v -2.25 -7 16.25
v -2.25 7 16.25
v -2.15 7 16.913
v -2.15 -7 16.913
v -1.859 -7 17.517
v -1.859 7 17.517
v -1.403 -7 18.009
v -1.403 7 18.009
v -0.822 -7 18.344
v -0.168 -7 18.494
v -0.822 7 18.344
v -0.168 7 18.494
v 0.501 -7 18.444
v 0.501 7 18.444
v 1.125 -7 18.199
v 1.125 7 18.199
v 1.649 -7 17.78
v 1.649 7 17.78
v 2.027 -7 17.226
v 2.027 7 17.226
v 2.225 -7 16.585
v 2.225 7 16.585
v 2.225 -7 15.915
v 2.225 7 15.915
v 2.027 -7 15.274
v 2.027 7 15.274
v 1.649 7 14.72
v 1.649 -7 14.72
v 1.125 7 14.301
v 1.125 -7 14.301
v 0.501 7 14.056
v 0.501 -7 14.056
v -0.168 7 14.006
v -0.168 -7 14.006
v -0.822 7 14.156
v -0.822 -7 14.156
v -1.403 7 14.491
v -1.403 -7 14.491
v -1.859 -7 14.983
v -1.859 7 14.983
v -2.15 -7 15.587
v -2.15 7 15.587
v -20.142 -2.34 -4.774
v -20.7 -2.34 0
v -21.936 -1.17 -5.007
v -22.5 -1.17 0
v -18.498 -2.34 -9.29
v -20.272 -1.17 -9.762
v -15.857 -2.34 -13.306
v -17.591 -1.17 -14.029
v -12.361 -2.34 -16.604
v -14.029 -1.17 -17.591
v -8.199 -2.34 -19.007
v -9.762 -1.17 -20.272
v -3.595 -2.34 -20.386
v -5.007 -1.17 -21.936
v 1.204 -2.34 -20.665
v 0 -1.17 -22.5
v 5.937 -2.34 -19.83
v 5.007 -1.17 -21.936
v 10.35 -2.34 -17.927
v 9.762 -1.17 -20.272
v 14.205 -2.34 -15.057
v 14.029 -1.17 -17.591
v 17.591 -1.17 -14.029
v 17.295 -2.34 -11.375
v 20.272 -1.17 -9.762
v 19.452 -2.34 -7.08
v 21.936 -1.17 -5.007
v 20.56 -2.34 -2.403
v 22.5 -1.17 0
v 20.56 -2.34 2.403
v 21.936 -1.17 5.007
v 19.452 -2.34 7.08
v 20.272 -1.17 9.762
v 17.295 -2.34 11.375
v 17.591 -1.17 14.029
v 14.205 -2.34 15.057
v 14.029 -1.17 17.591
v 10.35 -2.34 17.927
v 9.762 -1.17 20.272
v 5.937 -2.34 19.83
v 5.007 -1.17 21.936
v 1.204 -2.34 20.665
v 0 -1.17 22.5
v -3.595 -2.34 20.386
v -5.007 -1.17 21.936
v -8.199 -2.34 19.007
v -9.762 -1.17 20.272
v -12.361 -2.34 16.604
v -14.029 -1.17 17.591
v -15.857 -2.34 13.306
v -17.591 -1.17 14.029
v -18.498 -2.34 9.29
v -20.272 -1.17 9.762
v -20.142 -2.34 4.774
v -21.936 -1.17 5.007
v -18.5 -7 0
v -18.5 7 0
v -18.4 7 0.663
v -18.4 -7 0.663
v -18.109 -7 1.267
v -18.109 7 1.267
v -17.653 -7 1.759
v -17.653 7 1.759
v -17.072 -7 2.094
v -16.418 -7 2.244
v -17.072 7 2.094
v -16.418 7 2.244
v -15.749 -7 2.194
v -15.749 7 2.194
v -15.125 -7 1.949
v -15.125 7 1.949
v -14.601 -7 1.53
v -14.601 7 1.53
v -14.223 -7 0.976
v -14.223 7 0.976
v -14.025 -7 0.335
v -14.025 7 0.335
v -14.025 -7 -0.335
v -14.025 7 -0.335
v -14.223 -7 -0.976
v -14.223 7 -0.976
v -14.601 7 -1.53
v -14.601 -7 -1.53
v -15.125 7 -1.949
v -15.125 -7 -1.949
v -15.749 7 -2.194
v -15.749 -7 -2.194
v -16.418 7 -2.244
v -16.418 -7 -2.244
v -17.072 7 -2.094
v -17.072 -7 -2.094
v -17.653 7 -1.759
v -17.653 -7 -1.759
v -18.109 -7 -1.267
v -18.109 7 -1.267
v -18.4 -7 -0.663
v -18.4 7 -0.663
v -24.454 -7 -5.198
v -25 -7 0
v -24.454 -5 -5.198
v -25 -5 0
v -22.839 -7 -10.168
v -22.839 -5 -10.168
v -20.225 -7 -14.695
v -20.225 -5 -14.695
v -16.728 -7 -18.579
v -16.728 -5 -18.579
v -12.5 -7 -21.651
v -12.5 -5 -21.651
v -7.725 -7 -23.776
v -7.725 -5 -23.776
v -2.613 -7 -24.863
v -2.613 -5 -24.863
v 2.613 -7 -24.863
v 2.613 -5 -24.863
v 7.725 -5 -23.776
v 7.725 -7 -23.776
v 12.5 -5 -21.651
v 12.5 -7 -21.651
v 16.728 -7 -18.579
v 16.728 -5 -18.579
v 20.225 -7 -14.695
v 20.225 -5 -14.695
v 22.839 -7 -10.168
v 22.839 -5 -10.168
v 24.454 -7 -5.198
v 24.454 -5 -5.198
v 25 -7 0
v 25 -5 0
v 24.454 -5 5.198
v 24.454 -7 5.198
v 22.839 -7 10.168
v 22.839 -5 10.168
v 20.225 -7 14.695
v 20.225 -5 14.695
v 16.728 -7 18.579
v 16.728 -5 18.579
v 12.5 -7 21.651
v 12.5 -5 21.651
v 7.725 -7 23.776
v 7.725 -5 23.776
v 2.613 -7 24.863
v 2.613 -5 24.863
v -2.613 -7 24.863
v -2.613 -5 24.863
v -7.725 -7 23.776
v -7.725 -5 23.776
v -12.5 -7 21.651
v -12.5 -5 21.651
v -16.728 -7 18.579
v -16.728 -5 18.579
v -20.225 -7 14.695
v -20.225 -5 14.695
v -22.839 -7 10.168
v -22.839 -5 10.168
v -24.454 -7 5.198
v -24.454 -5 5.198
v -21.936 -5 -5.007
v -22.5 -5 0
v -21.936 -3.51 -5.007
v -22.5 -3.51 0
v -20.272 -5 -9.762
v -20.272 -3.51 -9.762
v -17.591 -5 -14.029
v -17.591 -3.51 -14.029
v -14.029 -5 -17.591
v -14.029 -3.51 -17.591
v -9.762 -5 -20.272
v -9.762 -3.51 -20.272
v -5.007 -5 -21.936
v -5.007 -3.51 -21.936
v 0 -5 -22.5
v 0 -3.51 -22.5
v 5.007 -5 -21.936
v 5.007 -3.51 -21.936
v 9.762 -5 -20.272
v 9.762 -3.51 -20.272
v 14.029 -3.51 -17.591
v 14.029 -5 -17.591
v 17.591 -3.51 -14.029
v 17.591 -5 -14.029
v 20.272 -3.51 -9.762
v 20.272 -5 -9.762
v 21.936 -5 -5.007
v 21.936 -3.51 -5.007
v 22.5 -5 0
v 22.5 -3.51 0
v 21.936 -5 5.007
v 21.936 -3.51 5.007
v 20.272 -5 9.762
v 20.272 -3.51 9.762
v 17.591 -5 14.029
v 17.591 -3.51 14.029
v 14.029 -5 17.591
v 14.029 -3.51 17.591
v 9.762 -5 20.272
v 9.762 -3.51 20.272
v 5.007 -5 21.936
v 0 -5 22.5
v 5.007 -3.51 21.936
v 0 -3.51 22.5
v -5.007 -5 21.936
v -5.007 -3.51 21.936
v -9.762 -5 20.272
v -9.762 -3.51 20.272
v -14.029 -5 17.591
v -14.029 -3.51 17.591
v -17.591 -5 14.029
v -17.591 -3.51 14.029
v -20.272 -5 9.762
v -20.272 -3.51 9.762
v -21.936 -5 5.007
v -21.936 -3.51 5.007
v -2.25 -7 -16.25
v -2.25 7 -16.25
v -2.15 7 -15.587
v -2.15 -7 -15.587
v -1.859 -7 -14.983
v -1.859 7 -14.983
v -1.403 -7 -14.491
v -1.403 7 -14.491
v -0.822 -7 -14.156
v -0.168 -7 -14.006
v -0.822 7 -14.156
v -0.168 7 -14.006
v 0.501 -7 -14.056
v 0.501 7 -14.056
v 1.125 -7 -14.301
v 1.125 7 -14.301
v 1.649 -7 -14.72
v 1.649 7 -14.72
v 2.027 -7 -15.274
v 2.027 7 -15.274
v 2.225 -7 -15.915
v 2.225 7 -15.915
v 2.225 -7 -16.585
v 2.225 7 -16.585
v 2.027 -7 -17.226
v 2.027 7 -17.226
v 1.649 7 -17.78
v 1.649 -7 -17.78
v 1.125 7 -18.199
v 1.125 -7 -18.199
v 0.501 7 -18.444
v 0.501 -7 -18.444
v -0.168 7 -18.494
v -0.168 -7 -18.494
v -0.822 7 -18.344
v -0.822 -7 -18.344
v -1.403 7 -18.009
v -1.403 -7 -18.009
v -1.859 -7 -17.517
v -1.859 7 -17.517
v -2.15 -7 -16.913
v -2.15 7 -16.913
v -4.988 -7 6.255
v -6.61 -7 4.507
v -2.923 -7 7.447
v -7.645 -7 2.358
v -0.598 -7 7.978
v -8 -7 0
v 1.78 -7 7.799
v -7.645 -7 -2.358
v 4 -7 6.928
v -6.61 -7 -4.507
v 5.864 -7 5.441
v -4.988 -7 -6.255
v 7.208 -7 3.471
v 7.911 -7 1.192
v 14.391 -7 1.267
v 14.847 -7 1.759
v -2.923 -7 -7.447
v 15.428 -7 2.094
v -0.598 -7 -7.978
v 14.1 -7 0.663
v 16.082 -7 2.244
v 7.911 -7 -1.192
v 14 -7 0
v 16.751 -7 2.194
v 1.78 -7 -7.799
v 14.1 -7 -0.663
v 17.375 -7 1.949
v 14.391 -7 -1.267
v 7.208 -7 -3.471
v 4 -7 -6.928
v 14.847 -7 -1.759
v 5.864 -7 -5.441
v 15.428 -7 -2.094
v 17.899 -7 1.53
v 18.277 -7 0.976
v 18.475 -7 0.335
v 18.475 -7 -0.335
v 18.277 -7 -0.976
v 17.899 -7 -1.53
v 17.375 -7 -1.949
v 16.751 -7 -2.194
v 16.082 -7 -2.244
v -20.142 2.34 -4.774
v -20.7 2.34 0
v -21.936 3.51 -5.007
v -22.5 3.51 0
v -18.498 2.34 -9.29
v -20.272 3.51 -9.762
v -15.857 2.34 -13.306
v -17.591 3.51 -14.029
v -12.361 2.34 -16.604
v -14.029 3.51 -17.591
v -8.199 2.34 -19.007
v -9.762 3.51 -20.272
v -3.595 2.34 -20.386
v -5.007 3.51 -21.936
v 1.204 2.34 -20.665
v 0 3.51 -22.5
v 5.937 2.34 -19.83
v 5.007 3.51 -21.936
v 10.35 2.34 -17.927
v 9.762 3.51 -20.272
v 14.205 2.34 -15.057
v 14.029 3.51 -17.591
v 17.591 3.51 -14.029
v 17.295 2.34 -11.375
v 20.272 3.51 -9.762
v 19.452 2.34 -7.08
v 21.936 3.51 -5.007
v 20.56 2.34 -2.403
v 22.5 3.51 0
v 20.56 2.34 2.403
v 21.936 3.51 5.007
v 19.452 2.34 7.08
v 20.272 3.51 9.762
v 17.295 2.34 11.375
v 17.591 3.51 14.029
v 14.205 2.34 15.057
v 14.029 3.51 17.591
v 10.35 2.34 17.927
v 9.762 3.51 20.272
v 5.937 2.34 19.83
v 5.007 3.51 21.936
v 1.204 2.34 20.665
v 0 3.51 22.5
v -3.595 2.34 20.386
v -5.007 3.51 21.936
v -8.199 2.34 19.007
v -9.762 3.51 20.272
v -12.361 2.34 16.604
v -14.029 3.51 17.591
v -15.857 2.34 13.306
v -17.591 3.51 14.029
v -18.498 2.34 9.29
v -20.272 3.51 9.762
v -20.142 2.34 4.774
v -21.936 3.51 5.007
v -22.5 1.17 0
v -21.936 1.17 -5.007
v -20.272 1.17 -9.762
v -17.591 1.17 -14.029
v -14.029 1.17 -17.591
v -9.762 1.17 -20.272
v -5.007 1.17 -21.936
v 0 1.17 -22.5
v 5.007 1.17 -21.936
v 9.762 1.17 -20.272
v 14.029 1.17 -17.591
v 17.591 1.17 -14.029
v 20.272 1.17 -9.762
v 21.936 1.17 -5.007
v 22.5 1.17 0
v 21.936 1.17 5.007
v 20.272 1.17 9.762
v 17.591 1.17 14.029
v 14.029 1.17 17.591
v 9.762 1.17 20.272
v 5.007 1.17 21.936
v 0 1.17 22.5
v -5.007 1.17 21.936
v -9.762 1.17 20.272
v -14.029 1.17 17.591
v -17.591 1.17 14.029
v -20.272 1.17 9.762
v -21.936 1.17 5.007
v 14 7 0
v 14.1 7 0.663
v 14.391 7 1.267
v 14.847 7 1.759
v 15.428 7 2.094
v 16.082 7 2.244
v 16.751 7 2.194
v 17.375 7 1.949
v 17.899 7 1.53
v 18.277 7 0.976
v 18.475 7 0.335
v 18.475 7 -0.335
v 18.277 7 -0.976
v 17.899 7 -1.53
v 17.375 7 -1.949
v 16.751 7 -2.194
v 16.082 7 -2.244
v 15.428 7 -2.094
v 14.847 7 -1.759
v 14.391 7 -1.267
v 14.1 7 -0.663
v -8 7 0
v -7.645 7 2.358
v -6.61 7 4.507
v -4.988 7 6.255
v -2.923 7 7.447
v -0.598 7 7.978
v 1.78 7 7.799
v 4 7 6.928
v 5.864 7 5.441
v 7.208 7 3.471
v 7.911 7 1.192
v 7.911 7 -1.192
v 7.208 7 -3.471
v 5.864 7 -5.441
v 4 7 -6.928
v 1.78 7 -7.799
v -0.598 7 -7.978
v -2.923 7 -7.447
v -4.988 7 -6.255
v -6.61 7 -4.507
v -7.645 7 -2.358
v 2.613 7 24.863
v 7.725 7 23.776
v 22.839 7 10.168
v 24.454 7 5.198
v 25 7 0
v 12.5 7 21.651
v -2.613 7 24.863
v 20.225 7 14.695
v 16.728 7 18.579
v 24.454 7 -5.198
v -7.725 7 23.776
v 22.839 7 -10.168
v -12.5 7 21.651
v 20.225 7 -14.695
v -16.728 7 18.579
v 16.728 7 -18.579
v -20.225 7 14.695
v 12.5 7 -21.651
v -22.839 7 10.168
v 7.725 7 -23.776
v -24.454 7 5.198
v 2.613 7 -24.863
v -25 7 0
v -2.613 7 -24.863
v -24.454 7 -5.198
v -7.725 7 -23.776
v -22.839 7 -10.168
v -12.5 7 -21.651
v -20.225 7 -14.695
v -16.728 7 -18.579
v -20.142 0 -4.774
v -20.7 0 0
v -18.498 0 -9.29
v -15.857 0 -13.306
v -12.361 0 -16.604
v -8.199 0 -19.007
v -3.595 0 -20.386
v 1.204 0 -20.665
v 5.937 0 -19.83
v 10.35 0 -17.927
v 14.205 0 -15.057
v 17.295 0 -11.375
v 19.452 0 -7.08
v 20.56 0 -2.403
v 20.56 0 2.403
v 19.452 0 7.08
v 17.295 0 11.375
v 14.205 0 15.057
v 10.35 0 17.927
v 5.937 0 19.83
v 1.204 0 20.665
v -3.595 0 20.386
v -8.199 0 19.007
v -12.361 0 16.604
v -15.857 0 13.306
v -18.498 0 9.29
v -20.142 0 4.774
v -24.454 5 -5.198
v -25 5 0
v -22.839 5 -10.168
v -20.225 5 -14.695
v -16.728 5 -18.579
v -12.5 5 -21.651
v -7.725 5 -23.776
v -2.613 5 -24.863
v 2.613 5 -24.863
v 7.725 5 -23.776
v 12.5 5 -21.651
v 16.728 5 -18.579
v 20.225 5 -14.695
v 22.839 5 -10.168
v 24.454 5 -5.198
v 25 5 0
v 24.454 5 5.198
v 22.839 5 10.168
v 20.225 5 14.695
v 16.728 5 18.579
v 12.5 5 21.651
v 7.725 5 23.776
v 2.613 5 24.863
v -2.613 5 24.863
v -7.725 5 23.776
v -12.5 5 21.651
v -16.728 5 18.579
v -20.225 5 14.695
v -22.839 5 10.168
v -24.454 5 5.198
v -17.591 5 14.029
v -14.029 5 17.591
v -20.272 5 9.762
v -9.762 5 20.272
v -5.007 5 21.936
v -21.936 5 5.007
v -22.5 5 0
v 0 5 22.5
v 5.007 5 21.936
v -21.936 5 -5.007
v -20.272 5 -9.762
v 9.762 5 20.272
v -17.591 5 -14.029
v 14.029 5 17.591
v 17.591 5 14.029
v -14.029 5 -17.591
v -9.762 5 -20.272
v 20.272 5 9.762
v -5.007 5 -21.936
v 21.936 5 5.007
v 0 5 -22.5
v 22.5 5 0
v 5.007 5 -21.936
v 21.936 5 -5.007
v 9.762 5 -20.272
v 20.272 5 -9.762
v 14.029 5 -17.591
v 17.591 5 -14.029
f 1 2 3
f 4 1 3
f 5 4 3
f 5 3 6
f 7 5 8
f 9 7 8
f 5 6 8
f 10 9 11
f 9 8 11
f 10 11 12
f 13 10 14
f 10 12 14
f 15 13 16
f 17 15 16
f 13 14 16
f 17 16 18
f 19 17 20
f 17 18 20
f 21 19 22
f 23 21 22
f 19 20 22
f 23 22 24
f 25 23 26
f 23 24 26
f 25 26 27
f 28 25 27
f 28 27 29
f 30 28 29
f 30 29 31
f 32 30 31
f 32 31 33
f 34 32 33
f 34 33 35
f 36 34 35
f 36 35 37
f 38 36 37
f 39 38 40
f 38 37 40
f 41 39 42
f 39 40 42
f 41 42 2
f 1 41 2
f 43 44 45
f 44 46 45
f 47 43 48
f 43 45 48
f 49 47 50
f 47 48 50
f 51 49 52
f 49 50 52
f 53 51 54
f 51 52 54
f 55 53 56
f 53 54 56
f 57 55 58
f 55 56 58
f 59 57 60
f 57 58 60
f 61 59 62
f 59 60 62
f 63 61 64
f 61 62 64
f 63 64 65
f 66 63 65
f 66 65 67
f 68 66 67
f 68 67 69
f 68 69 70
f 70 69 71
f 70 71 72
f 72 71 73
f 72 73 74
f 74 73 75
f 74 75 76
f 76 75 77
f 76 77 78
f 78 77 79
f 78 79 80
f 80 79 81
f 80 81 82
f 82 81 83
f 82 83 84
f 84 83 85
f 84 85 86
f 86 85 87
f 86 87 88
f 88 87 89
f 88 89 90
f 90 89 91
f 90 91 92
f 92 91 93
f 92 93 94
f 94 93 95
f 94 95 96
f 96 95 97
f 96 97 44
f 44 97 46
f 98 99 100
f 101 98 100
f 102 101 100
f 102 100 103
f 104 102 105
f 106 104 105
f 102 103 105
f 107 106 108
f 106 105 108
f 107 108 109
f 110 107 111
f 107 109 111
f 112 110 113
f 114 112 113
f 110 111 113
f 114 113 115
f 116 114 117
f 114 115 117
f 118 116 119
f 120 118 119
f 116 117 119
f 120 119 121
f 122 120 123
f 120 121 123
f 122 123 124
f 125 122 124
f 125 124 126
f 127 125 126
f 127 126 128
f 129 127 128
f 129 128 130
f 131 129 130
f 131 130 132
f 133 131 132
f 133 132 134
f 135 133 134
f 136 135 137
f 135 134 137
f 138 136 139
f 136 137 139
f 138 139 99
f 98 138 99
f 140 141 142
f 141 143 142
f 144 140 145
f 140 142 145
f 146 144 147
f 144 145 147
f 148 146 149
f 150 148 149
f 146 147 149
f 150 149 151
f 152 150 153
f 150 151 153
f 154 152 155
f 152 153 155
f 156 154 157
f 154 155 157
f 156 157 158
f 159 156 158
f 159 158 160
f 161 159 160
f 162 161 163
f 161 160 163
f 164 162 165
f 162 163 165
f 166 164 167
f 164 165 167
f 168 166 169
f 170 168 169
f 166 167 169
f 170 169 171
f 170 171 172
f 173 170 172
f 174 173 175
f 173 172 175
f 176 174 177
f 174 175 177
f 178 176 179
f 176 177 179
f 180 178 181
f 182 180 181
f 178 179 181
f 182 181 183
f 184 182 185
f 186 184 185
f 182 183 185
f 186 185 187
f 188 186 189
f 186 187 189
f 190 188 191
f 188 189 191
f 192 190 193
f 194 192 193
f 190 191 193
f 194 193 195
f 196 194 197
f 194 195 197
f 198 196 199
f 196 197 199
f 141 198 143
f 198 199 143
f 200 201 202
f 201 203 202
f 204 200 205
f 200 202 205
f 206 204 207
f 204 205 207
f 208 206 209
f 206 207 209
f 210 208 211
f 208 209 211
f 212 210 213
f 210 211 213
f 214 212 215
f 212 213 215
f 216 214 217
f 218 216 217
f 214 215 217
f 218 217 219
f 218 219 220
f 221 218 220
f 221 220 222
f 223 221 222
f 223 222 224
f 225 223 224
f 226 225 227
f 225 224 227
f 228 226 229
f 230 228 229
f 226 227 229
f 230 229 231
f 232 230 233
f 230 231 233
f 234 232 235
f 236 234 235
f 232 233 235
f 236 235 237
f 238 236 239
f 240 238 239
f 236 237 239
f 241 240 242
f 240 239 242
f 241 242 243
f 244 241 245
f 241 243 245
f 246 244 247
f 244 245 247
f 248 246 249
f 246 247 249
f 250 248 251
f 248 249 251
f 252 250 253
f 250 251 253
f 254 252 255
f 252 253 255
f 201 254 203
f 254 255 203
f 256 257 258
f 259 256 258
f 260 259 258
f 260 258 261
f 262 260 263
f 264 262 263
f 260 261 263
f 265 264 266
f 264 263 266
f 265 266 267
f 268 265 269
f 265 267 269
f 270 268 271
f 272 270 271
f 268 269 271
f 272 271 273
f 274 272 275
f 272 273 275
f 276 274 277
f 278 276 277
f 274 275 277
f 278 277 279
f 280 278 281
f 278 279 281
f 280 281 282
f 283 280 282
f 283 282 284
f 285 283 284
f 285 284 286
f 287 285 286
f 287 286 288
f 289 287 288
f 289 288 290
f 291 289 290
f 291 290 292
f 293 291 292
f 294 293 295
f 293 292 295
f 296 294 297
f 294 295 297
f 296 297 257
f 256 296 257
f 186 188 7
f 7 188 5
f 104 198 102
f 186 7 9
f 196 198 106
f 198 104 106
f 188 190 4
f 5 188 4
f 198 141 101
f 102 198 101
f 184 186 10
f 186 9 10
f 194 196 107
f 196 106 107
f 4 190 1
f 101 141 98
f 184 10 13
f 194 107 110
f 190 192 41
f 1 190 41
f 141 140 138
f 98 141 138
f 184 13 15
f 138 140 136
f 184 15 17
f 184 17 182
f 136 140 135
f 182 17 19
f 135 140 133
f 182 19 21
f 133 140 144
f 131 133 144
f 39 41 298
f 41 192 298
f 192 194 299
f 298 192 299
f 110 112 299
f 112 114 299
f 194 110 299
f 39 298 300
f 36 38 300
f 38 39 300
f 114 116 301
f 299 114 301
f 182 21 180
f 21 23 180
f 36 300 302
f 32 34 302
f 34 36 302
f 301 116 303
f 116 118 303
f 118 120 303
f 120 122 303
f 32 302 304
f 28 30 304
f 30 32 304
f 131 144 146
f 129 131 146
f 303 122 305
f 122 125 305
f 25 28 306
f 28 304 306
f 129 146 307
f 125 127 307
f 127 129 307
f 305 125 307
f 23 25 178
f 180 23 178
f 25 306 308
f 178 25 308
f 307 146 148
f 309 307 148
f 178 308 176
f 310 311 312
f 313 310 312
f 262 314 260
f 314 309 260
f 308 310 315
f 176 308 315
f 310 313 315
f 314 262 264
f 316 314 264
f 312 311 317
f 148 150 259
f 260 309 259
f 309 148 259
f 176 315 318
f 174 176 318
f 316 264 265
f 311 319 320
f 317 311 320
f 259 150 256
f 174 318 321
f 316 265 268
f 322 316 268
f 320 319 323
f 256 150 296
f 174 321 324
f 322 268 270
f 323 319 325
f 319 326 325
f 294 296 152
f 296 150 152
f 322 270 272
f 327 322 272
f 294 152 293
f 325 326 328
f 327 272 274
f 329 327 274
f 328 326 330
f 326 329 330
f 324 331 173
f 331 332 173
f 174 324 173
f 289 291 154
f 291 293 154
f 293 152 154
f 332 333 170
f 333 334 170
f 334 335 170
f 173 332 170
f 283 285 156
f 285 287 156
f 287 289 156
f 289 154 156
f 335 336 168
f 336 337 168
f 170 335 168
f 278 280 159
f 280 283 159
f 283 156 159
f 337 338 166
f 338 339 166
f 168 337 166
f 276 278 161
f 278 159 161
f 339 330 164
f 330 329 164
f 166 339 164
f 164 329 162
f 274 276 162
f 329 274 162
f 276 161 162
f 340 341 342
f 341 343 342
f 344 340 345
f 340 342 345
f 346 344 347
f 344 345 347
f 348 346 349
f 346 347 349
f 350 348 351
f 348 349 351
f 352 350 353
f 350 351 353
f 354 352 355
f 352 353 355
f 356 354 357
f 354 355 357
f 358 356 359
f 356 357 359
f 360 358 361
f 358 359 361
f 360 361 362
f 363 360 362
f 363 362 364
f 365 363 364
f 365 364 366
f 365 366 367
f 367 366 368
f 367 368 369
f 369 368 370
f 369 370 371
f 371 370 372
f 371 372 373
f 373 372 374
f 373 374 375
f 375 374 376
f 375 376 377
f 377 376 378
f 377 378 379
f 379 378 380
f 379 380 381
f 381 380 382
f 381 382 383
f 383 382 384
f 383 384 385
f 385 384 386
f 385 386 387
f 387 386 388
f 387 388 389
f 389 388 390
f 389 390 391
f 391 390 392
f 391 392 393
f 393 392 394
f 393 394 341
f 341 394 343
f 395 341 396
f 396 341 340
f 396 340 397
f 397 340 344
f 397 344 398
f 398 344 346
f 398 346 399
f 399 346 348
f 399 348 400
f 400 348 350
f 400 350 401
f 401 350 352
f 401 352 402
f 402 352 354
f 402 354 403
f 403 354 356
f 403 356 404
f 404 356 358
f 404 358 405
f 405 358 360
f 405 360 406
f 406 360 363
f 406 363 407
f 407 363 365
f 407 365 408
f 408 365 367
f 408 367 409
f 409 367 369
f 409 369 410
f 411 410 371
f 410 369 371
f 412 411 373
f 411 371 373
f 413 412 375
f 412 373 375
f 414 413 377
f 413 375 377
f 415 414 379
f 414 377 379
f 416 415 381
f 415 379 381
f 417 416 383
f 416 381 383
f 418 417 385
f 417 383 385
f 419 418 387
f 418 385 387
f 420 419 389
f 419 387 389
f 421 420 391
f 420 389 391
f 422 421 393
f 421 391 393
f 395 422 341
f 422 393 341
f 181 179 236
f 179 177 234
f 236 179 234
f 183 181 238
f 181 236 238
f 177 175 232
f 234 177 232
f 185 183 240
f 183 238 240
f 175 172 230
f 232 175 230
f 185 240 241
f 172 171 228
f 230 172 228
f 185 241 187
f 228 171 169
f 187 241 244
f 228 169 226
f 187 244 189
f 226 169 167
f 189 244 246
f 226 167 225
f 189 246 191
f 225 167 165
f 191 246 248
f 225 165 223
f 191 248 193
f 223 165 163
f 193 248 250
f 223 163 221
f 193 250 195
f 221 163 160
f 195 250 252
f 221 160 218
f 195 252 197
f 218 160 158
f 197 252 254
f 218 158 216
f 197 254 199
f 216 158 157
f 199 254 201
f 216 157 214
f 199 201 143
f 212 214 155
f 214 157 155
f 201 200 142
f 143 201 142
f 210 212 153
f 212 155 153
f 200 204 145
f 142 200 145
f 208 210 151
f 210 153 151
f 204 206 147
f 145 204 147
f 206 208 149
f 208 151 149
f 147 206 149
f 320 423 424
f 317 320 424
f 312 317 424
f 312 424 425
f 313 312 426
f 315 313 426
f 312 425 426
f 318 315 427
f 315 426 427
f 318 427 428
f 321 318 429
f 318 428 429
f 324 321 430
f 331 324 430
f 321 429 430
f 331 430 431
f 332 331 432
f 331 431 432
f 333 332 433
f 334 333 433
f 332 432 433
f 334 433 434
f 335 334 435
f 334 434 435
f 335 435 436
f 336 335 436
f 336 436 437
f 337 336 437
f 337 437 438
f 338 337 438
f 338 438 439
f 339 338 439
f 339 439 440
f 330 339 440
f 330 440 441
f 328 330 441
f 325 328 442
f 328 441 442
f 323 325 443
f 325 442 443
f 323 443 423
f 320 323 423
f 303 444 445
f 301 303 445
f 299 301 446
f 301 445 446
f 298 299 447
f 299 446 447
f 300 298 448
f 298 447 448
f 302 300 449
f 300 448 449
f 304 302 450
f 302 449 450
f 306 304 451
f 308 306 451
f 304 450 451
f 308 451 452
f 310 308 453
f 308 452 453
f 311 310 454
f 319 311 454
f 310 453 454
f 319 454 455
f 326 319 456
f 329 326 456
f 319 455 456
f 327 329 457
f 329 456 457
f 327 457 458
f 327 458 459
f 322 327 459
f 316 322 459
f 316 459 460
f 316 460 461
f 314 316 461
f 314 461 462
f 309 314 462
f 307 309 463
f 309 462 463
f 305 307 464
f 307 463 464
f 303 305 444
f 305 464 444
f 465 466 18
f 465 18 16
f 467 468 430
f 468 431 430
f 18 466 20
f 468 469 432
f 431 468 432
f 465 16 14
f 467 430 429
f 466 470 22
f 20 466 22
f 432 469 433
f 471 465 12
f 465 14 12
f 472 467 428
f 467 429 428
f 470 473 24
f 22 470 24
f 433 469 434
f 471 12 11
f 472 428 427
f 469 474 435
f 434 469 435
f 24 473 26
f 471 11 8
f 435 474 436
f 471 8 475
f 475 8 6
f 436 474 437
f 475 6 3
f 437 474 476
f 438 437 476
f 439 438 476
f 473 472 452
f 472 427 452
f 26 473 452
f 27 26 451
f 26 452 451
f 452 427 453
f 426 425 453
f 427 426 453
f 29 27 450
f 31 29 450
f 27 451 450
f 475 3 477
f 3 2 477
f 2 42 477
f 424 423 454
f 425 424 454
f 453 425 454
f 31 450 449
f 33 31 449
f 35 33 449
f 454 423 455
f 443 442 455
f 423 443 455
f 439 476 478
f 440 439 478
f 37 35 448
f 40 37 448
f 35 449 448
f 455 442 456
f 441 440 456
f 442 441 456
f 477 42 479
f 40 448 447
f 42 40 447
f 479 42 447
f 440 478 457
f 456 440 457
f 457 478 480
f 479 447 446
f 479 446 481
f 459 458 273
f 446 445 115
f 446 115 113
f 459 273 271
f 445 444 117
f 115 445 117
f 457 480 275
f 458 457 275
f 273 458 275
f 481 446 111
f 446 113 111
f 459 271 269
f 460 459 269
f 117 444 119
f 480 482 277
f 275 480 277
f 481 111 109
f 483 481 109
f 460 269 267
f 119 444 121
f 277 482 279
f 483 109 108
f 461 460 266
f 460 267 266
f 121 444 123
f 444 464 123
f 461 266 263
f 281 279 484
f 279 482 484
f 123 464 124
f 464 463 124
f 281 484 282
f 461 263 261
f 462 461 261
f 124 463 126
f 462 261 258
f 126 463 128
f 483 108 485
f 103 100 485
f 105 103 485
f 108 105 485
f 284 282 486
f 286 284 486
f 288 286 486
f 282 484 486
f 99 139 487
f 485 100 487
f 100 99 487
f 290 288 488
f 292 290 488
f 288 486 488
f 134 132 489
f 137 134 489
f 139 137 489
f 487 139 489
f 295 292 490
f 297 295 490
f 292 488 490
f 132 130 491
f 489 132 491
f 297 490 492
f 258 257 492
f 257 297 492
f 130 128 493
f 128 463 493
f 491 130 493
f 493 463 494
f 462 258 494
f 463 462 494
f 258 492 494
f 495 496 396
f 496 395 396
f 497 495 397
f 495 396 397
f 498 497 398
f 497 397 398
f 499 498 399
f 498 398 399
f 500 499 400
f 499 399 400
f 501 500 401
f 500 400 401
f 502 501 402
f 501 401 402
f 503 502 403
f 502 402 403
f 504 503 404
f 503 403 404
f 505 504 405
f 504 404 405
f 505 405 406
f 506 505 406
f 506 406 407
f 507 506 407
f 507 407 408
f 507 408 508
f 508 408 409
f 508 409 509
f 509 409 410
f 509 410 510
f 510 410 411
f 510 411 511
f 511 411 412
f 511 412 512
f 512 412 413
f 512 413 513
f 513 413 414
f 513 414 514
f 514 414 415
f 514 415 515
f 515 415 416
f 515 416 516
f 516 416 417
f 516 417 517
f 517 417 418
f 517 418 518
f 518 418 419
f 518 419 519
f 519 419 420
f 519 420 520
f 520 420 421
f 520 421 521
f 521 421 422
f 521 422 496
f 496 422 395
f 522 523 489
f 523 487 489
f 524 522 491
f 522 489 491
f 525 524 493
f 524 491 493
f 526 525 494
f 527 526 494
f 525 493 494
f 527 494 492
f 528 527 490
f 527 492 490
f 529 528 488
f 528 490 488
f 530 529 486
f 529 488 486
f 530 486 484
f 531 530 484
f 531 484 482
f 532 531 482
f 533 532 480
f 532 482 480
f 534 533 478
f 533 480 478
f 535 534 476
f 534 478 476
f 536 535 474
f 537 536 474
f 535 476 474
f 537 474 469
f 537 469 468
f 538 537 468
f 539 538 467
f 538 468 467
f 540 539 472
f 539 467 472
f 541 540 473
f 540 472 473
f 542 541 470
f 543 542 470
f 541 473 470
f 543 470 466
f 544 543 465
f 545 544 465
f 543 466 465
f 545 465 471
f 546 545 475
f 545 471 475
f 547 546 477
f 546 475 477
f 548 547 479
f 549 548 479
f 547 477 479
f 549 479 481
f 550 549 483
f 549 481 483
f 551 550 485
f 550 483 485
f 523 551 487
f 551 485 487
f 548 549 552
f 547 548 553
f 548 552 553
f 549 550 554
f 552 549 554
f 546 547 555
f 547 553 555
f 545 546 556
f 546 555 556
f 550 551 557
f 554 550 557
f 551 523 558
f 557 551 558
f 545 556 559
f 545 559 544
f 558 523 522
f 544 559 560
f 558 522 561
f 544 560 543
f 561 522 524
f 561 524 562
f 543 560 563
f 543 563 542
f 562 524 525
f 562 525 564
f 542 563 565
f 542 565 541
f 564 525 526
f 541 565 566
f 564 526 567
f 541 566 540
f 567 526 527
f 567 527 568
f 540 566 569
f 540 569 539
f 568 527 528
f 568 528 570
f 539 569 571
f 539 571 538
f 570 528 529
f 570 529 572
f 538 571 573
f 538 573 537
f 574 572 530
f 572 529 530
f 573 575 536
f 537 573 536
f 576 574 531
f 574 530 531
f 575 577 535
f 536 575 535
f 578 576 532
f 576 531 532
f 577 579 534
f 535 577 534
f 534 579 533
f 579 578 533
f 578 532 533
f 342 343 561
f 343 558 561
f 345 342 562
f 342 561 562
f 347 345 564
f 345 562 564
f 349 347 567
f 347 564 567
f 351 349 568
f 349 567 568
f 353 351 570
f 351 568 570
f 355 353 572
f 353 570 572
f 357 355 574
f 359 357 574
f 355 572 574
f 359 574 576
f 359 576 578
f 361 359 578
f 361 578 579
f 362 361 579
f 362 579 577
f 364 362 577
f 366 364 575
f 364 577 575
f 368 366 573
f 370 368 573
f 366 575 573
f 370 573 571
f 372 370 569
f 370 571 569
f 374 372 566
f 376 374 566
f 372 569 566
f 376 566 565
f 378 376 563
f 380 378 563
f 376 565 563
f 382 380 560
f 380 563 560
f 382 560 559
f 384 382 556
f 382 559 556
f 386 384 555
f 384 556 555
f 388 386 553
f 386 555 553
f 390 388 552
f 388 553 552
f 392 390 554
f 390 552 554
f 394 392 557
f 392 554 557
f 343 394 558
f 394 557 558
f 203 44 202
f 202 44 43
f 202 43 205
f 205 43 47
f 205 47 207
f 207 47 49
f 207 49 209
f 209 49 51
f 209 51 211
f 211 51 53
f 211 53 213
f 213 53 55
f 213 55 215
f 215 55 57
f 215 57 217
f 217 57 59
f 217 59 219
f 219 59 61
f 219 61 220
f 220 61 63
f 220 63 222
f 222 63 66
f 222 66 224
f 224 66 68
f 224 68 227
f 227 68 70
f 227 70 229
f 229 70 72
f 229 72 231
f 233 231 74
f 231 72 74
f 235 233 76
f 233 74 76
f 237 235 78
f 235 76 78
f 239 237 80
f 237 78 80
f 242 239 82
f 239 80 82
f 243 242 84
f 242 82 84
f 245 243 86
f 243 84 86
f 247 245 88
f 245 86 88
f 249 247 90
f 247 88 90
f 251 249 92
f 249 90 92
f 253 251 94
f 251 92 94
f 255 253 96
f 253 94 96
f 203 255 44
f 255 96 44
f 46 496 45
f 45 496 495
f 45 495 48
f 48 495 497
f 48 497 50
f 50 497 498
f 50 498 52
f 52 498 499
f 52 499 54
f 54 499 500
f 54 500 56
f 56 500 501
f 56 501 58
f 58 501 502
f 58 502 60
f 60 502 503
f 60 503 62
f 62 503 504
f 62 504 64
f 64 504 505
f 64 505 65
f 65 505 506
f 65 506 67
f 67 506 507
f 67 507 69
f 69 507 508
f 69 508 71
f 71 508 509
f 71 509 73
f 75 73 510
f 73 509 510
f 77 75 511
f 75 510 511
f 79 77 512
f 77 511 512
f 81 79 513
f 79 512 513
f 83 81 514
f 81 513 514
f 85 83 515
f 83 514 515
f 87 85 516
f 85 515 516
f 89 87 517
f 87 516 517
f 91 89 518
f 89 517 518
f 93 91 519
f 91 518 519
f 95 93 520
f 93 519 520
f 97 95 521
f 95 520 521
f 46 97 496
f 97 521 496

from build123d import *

# Parameters (mm, degrees)
ESBO_O2_R             = 2.25
ESBO_O2_R_2           = 8
CORTE_EXTRUS_O1_DEPTH = 14


with BuildPart() as part:
    # Esboço1 → Revolução1 (revolve)
    with BuildSketch(Plane.XY):
        Polygon((0, 7), (0, -7), (-25, -7), (-25, -5), (-22.5, -5), (-22.5, -3.51), (-20.7, -2.34), (-22.5, -1.17), (-20.7, 0), (-22.5, 1.17), (-20.7, 2.34), (-22.5, 3.51), (-22.5, 5), (-25, 5), (-25, 7), align=None)
    revolve(axis=Axis((0, 7, 0), (0, -1, 0)))

    # Esboço2 → Corte-extrusão1 (cut)
    with BuildSketch(Plane(origin=(0, 7, 0), x_dir=(1, 0, 0), z_dir=(0, 1, 0))):
        with Locations(Location((16.25, 0, 0), (0, 0, 180))):
            Circle(ESBO_O2_R)
        with Locations(Location((0, -16.25, 0), (0, 0, 180))):
            Circle(ESBO_O2_R)
        with Locations(Location((-16.25, 0, 0), (0, 0, 180))):
            Circle(ESBO_O2_R)
        with Locations(Location((0, 16.25, 0), (0, 0, 180))):
            Circle(ESBO_O2_R)
        with Locations(Location((0, 0, 0), (0, 0, 180))):
            Circle(ESBO_O2_R_2)
    extrude(amount=-CORTE_EXTRUS_O1_DEPTH, mode=Mode.SUBTRACT)


solid = part.part
